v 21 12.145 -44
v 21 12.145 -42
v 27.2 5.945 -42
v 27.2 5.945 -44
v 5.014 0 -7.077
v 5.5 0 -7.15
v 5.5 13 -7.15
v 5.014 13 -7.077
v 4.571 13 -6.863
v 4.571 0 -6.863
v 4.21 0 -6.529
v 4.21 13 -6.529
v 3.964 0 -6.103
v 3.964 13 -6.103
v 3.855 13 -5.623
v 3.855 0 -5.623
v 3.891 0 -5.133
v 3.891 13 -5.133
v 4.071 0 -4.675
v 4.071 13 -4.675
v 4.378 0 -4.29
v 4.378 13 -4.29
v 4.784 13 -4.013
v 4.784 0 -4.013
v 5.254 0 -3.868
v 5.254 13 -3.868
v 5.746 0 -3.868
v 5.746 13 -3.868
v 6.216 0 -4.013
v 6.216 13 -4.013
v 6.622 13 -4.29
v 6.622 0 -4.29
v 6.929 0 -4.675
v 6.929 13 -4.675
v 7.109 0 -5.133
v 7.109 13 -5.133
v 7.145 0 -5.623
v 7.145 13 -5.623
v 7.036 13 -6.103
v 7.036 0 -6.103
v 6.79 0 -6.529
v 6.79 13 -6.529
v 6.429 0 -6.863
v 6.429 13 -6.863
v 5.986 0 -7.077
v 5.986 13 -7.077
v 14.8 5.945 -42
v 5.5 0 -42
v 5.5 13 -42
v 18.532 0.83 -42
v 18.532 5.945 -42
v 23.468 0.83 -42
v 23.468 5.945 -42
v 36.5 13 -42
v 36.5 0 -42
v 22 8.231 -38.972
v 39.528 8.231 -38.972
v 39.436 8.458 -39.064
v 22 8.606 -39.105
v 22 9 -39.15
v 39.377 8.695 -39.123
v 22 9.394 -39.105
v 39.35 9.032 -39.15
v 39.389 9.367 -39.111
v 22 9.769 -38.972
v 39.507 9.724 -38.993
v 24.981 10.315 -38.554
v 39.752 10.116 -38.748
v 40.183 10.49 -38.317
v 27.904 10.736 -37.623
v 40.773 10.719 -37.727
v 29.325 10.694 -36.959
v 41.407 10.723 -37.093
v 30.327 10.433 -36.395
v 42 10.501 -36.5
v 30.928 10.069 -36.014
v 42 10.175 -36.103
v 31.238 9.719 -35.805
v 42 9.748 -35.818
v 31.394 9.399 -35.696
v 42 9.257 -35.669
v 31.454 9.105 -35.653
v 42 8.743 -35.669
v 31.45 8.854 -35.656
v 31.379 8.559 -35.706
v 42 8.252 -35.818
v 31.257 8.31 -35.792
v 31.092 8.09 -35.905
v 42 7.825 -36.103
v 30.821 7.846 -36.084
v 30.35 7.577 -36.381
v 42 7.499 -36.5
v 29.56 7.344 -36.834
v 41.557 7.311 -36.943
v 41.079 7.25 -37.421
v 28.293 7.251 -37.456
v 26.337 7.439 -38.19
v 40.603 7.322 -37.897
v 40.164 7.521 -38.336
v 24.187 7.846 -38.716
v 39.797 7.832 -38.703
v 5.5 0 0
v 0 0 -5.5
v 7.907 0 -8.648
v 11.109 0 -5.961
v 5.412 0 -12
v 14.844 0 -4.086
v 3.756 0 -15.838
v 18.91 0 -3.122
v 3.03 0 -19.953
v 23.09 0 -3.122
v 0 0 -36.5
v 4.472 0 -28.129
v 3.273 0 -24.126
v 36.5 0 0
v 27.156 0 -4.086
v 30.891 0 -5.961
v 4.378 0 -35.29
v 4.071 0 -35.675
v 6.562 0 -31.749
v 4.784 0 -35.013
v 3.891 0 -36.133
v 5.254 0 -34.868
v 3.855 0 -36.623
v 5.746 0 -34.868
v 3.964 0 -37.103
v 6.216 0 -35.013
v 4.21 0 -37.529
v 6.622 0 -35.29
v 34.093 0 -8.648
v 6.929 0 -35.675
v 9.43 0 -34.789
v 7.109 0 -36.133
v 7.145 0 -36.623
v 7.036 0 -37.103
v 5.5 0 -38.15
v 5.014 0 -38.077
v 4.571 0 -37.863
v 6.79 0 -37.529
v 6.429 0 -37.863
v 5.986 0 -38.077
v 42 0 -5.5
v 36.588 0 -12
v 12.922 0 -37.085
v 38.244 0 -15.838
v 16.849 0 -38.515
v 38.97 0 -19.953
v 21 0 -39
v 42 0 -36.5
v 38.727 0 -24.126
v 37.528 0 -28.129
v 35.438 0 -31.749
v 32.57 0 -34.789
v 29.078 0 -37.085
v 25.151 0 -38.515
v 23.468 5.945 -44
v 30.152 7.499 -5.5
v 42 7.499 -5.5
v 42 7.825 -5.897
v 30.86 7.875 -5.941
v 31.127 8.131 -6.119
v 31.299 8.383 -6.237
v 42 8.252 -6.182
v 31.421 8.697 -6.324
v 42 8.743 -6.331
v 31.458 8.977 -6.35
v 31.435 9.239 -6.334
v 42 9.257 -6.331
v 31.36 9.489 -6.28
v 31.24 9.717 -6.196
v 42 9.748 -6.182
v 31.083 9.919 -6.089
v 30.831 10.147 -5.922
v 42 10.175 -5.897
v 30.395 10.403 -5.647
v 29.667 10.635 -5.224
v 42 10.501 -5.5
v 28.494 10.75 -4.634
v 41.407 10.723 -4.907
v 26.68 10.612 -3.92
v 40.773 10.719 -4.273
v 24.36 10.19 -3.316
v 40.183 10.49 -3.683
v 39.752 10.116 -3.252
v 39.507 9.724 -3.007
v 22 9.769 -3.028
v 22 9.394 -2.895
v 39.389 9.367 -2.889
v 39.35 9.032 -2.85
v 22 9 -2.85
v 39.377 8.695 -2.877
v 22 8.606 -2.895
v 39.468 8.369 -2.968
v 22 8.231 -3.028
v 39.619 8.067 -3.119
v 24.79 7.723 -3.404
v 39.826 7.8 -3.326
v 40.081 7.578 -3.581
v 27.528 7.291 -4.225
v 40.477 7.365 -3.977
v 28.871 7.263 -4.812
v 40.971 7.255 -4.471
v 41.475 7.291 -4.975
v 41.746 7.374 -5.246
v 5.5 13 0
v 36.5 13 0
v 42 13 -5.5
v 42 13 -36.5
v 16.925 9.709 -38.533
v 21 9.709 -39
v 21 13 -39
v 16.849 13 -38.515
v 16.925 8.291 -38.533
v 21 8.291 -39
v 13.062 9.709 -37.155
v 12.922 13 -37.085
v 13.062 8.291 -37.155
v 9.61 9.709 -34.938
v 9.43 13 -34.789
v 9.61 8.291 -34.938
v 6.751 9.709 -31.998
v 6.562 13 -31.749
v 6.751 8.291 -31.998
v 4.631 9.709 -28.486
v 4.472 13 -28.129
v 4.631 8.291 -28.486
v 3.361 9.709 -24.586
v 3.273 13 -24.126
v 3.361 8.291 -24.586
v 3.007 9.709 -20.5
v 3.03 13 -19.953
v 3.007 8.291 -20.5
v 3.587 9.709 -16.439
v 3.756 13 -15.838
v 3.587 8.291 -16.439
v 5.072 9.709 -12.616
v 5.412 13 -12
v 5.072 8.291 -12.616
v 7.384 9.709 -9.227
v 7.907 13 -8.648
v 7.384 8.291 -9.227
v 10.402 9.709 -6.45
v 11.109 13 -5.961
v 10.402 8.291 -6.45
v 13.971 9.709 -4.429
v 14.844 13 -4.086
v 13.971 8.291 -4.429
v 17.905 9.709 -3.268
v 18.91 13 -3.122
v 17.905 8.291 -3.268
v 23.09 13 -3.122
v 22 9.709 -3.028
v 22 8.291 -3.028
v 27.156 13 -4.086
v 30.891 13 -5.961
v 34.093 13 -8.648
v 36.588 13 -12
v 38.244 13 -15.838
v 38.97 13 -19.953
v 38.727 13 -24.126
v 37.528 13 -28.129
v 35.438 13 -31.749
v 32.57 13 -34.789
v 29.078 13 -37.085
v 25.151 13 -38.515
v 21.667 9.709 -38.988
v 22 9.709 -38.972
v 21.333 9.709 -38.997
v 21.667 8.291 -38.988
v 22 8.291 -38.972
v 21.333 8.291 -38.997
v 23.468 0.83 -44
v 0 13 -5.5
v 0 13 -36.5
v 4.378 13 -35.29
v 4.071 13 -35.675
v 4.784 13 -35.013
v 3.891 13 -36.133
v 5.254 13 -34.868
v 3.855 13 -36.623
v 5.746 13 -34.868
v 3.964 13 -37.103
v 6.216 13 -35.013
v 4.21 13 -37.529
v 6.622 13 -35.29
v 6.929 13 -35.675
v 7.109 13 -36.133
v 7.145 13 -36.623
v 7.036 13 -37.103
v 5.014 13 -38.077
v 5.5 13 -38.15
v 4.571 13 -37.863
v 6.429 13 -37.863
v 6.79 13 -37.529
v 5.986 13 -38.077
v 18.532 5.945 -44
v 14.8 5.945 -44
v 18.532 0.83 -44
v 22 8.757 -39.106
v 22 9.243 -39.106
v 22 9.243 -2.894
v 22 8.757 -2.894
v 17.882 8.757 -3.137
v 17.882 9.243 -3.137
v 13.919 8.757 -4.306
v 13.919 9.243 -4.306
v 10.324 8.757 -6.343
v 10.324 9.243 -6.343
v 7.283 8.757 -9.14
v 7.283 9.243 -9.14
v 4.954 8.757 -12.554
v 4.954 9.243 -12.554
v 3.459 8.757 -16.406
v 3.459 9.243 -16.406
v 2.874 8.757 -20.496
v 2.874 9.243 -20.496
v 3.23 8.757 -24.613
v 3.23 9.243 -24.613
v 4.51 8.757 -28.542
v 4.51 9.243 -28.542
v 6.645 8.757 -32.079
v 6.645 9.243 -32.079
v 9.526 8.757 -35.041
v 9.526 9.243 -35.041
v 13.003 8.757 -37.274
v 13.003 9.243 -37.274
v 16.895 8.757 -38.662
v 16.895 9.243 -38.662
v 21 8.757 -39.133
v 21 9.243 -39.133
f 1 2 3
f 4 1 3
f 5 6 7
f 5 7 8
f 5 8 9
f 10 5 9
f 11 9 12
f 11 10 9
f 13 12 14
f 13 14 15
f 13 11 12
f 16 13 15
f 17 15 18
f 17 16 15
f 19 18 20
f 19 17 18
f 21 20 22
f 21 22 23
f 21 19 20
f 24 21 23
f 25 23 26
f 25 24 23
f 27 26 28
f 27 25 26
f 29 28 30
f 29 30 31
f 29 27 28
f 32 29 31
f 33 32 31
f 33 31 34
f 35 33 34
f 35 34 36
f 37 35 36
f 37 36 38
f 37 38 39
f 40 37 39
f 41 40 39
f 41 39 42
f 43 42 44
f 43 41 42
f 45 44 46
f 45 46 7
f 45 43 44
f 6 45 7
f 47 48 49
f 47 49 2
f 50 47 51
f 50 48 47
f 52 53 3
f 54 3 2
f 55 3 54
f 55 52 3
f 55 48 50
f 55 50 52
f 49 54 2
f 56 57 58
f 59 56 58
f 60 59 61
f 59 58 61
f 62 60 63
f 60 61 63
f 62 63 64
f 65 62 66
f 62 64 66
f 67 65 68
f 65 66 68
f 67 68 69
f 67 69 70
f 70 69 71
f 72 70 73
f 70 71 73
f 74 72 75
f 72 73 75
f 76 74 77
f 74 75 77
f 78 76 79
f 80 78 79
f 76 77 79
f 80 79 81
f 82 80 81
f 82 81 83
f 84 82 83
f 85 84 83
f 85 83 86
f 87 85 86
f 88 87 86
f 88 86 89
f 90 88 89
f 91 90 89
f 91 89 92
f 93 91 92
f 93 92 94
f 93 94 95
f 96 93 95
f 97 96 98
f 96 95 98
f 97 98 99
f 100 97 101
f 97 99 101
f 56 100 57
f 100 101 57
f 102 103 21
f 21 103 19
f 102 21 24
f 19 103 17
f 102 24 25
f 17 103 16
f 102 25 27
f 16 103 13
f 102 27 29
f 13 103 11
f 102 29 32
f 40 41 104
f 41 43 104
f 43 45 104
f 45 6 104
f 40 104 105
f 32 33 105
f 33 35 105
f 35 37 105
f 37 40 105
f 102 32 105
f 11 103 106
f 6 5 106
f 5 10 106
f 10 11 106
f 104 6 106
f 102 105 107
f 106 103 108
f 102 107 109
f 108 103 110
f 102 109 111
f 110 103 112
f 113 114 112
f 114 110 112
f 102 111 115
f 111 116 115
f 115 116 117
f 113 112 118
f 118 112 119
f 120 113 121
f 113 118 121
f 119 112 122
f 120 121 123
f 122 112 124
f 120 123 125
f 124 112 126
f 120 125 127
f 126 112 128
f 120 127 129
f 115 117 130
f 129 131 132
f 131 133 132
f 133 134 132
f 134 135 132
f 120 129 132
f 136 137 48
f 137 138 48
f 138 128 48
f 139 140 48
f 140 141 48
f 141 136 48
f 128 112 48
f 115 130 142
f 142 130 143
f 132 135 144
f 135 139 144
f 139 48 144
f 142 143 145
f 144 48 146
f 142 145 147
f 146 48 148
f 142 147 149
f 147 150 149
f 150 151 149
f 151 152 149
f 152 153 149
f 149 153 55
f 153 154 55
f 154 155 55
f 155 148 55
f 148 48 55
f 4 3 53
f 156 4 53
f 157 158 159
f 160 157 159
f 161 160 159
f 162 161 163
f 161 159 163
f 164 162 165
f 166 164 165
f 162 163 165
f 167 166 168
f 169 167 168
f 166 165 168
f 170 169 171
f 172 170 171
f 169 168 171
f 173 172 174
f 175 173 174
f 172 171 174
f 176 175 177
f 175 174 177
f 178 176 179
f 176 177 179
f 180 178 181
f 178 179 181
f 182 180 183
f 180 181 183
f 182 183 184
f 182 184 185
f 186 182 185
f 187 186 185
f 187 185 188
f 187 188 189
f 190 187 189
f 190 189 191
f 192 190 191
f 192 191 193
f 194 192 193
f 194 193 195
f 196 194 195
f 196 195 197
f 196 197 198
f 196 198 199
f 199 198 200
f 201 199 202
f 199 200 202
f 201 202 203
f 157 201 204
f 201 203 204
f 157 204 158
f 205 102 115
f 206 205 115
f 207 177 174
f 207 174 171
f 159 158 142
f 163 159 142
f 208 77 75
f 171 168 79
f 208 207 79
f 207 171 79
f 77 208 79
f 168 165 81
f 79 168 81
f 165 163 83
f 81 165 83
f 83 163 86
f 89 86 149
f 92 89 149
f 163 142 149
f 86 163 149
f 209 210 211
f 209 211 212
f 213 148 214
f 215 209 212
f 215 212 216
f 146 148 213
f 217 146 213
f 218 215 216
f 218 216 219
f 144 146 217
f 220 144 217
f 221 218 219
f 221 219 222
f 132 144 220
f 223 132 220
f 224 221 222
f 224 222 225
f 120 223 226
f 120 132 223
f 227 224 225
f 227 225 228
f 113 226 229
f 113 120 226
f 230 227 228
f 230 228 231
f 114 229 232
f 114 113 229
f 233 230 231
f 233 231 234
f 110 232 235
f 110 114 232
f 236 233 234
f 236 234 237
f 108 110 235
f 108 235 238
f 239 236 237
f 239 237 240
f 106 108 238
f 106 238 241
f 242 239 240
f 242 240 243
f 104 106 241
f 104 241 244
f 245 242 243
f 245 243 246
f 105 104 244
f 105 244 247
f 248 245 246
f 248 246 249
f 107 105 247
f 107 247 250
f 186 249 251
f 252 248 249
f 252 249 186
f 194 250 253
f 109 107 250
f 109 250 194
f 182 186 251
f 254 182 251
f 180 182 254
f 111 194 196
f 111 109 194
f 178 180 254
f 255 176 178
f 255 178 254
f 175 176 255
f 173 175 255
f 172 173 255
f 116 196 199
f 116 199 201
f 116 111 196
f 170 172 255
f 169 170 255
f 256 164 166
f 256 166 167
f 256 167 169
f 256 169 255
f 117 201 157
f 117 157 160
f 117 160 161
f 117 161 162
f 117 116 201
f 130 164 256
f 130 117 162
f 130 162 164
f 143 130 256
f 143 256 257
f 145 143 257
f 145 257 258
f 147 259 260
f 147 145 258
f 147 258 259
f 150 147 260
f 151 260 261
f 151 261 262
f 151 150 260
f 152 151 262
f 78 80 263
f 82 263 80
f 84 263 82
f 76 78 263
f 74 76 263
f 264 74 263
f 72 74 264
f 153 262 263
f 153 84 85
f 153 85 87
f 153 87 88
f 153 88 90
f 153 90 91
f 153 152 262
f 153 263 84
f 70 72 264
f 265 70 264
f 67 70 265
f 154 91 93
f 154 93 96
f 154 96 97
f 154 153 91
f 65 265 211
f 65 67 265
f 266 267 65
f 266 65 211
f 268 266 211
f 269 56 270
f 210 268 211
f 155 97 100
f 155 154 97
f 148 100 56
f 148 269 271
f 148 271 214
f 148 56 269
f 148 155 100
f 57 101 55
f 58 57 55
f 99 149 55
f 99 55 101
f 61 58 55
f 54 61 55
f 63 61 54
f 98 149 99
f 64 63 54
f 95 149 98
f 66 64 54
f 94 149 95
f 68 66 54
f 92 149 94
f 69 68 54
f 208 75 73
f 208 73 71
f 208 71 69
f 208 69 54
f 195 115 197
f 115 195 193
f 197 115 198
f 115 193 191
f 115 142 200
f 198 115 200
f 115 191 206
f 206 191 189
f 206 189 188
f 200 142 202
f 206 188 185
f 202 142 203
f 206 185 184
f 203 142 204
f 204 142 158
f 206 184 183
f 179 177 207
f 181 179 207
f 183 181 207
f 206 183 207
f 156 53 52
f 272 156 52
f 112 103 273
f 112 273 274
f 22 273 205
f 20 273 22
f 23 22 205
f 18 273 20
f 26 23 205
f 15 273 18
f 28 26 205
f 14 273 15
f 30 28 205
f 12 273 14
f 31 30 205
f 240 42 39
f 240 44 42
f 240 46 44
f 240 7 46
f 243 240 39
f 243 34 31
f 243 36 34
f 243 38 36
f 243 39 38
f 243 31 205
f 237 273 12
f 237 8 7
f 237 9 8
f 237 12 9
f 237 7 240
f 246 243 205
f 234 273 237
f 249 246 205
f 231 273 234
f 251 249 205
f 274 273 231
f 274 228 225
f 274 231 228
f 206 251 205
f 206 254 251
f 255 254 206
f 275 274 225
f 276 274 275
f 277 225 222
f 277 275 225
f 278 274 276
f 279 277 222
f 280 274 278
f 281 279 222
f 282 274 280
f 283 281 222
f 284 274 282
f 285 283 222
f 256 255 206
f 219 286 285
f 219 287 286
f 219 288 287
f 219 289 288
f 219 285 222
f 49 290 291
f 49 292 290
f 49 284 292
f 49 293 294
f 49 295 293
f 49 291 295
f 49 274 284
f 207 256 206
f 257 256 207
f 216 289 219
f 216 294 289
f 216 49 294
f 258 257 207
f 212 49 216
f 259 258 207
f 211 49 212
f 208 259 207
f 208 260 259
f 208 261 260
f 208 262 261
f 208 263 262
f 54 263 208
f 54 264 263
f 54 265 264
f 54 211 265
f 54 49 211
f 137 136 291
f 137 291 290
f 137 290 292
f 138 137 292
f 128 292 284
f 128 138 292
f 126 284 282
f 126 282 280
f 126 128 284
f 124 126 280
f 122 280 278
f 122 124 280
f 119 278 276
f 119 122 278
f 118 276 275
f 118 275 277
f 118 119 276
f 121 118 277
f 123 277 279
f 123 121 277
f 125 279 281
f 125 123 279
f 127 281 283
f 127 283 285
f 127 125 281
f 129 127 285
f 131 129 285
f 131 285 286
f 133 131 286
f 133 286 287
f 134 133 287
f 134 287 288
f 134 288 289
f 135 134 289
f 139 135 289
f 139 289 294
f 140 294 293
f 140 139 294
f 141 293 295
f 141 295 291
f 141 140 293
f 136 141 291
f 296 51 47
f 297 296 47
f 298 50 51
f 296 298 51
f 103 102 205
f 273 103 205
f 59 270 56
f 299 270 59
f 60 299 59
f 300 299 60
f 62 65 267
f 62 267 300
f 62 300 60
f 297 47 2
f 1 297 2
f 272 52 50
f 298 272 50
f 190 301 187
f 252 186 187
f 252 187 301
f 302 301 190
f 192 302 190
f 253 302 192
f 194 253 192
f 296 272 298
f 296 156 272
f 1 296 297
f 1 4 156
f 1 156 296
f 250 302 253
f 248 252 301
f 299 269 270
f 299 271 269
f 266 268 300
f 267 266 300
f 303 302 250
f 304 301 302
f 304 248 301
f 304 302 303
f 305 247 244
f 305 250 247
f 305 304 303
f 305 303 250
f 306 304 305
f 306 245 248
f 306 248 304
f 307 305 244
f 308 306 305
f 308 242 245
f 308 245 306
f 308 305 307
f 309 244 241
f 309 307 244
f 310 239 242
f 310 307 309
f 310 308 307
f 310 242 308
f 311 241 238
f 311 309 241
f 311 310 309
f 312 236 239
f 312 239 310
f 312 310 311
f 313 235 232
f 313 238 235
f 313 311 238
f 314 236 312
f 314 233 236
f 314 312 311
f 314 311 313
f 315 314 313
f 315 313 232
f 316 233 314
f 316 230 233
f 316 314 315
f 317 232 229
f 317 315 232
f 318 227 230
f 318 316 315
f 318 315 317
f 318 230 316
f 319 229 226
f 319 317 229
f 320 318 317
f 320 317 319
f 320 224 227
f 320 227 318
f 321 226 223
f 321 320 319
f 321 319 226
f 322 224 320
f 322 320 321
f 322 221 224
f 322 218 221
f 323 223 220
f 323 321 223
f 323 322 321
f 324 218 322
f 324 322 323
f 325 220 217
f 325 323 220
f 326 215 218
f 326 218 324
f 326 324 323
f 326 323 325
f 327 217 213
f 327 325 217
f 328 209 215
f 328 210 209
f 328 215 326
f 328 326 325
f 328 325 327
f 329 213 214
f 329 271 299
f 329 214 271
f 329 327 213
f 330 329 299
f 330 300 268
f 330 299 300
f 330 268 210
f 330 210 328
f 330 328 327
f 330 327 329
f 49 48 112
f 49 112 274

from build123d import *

# Parameters (mm, degrees)
SKETCH1_W                    = 42
SKETCH1_H                    = 42
SKETCH1_R                    = 1.65
SKETCH1_R_2                  = 18
BOSS_EXTRUDE1_DEPTH          = 13
CHAMFER1_SIZE                = 5.5
SKETCH3_R                    = 1.75
CUT_EXTRUDE2_DEPTH           = 20
SKETCH4_R                    = 1.75
CUT_EXTRUDE3_DEPTH           = 20
BOSS_EXTRUDE2_DEPTH          = 2
CUT_REVOLVE1_ANGLE           = 183.3
CUT_REVOLVE1_OTHER_WAY_ANGLE = 3.2


with BuildPart() as part:
    # Sketch1 → Boss-Extrude1 (new body)
    with BuildSketch(Plane(origin=(0, 0, 0), x_dir=(1, 0, 0), z_dir=(0, 1, 0))):
        with Locations((21, 21)):
            Rectangle(SKETCH1_W, SKETCH1_H)
        with Locations(Location((5.5, 36.5, 0), (0, 0, 90))):
            Circle(SKETCH1_R, mode=Mode.SUBTRACT)
        with Locations(Location((5.5, 5.5, 0), (0, 0, 90))):
            Circle(SKETCH1_R, mode=Mode.SUBTRACT)
        with Locations(Location((21, 21, 0), (0, 0, 90))):
            Circle(SKETCH1_R_2, mode=Mode.SUBTRACT)
    extrude(amount=BOSS_EXTRUDE1_DEPTH)

    # Chamfer1
    chamfer1_edges = [part.edges().sort_by_distance(p)[0] for p in [
        (0, 6.5, -42),
        (42, 6.5, -42),
        (42, 6.5, 0),
        (0, 6.5, 0),
    ]]
    chamfer(chamfer1_edges, length=CHAMFER1_SIZE)

    # Sketch3 → Cut-Extrude2 (cut)
    with BuildSketch(Plane(origin=(42, 0, 0), x_dir=(0, 0, -1), z_dir=(1, 0, 0))):
        with Locations(Location((37.4, 9, 0), (0, 0, 333.948601241))):
            Circle(SKETCH3_R)
    extrude(amount=-CUT_EXTRUDE2_DEPTH, mode=Mode.SUBTRACT)

    # Sketch4 → Cut-Extrude3 (cut)
    with BuildSketch(Plane(origin=(42, 0, 0), x_dir=(0, 0, -1), z_dir=(1, 0, 0))):
        with Locations(Location((4.6, 9, 0), (0, 0, 300.949723079))):
            Circle(SKETCH4_R)
    extrude(amount=-CUT_EXTRUDE3_DEPTH, mode=Mode.SUBTRACT)

    # Sketch6 → Boss-Extrude2 (add)
    with BuildSketch(Plane(origin=(0, 0, -42), x_dir=(-1, 0, 0), z_dir=(0, 0, -1))):
        Polygon((-23.468351512, 0.829629357), (-18.531648488, 0.829629357), (-18.531648488, 5.944922789), (-14.8, 5.944922789), (-21, 12.144922789), (-27.2, 5.944922789), (-23.468351512, 5.944922789), align=None)
    extrude(amount=BOSS_EXTRUDE2_DEPTH)

    # Sketch9 → Cut-Revolve1 (revolve, cut)
    with BuildSketch(Plane(origin=(21, 0, 0), x_dir=(0, 0, -1), z_dir=(1, 0, 0))):
        with BuildLine():
            Line((3.027799244, 9.768560202), (3.027799244, 8.231439798))
            ThreePointArc((3.027799244, 8.231439798), (2.85, 9), (3.027799244, 9.768560202))
        make_face()
    revolve(axis=Axis((21, 18.192178388, -21), (0, -1, 0)), revolution_arc=CUT_REVOLVE1_ANGLE, mode=Mode.SUBTRACT)

    # Sketch9 → Cut-Revolve1 other way (revolve, cut)
    with BuildSketch(Plane(origin=(21, 0, 0), x_dir=(0, 0, -1), z_dir=(1, 0, 0))):
        with BuildLine():
            Line((3.027799244, 9.768560202), (3.027799244, 8.231439798))
            ThreePointArc((3.027799244, 8.231439798), (2.85, 9), (3.027799244, 9.768560202))
        make_face()
    revolve(axis=Axis((21, 18.192178388, -21), (0, 1, 0)), revolution_arc=CUT_REVOLVE1_OTHER_WAY_ANGLE, mode=Mode.SUBTRACT)


solid = part.part
